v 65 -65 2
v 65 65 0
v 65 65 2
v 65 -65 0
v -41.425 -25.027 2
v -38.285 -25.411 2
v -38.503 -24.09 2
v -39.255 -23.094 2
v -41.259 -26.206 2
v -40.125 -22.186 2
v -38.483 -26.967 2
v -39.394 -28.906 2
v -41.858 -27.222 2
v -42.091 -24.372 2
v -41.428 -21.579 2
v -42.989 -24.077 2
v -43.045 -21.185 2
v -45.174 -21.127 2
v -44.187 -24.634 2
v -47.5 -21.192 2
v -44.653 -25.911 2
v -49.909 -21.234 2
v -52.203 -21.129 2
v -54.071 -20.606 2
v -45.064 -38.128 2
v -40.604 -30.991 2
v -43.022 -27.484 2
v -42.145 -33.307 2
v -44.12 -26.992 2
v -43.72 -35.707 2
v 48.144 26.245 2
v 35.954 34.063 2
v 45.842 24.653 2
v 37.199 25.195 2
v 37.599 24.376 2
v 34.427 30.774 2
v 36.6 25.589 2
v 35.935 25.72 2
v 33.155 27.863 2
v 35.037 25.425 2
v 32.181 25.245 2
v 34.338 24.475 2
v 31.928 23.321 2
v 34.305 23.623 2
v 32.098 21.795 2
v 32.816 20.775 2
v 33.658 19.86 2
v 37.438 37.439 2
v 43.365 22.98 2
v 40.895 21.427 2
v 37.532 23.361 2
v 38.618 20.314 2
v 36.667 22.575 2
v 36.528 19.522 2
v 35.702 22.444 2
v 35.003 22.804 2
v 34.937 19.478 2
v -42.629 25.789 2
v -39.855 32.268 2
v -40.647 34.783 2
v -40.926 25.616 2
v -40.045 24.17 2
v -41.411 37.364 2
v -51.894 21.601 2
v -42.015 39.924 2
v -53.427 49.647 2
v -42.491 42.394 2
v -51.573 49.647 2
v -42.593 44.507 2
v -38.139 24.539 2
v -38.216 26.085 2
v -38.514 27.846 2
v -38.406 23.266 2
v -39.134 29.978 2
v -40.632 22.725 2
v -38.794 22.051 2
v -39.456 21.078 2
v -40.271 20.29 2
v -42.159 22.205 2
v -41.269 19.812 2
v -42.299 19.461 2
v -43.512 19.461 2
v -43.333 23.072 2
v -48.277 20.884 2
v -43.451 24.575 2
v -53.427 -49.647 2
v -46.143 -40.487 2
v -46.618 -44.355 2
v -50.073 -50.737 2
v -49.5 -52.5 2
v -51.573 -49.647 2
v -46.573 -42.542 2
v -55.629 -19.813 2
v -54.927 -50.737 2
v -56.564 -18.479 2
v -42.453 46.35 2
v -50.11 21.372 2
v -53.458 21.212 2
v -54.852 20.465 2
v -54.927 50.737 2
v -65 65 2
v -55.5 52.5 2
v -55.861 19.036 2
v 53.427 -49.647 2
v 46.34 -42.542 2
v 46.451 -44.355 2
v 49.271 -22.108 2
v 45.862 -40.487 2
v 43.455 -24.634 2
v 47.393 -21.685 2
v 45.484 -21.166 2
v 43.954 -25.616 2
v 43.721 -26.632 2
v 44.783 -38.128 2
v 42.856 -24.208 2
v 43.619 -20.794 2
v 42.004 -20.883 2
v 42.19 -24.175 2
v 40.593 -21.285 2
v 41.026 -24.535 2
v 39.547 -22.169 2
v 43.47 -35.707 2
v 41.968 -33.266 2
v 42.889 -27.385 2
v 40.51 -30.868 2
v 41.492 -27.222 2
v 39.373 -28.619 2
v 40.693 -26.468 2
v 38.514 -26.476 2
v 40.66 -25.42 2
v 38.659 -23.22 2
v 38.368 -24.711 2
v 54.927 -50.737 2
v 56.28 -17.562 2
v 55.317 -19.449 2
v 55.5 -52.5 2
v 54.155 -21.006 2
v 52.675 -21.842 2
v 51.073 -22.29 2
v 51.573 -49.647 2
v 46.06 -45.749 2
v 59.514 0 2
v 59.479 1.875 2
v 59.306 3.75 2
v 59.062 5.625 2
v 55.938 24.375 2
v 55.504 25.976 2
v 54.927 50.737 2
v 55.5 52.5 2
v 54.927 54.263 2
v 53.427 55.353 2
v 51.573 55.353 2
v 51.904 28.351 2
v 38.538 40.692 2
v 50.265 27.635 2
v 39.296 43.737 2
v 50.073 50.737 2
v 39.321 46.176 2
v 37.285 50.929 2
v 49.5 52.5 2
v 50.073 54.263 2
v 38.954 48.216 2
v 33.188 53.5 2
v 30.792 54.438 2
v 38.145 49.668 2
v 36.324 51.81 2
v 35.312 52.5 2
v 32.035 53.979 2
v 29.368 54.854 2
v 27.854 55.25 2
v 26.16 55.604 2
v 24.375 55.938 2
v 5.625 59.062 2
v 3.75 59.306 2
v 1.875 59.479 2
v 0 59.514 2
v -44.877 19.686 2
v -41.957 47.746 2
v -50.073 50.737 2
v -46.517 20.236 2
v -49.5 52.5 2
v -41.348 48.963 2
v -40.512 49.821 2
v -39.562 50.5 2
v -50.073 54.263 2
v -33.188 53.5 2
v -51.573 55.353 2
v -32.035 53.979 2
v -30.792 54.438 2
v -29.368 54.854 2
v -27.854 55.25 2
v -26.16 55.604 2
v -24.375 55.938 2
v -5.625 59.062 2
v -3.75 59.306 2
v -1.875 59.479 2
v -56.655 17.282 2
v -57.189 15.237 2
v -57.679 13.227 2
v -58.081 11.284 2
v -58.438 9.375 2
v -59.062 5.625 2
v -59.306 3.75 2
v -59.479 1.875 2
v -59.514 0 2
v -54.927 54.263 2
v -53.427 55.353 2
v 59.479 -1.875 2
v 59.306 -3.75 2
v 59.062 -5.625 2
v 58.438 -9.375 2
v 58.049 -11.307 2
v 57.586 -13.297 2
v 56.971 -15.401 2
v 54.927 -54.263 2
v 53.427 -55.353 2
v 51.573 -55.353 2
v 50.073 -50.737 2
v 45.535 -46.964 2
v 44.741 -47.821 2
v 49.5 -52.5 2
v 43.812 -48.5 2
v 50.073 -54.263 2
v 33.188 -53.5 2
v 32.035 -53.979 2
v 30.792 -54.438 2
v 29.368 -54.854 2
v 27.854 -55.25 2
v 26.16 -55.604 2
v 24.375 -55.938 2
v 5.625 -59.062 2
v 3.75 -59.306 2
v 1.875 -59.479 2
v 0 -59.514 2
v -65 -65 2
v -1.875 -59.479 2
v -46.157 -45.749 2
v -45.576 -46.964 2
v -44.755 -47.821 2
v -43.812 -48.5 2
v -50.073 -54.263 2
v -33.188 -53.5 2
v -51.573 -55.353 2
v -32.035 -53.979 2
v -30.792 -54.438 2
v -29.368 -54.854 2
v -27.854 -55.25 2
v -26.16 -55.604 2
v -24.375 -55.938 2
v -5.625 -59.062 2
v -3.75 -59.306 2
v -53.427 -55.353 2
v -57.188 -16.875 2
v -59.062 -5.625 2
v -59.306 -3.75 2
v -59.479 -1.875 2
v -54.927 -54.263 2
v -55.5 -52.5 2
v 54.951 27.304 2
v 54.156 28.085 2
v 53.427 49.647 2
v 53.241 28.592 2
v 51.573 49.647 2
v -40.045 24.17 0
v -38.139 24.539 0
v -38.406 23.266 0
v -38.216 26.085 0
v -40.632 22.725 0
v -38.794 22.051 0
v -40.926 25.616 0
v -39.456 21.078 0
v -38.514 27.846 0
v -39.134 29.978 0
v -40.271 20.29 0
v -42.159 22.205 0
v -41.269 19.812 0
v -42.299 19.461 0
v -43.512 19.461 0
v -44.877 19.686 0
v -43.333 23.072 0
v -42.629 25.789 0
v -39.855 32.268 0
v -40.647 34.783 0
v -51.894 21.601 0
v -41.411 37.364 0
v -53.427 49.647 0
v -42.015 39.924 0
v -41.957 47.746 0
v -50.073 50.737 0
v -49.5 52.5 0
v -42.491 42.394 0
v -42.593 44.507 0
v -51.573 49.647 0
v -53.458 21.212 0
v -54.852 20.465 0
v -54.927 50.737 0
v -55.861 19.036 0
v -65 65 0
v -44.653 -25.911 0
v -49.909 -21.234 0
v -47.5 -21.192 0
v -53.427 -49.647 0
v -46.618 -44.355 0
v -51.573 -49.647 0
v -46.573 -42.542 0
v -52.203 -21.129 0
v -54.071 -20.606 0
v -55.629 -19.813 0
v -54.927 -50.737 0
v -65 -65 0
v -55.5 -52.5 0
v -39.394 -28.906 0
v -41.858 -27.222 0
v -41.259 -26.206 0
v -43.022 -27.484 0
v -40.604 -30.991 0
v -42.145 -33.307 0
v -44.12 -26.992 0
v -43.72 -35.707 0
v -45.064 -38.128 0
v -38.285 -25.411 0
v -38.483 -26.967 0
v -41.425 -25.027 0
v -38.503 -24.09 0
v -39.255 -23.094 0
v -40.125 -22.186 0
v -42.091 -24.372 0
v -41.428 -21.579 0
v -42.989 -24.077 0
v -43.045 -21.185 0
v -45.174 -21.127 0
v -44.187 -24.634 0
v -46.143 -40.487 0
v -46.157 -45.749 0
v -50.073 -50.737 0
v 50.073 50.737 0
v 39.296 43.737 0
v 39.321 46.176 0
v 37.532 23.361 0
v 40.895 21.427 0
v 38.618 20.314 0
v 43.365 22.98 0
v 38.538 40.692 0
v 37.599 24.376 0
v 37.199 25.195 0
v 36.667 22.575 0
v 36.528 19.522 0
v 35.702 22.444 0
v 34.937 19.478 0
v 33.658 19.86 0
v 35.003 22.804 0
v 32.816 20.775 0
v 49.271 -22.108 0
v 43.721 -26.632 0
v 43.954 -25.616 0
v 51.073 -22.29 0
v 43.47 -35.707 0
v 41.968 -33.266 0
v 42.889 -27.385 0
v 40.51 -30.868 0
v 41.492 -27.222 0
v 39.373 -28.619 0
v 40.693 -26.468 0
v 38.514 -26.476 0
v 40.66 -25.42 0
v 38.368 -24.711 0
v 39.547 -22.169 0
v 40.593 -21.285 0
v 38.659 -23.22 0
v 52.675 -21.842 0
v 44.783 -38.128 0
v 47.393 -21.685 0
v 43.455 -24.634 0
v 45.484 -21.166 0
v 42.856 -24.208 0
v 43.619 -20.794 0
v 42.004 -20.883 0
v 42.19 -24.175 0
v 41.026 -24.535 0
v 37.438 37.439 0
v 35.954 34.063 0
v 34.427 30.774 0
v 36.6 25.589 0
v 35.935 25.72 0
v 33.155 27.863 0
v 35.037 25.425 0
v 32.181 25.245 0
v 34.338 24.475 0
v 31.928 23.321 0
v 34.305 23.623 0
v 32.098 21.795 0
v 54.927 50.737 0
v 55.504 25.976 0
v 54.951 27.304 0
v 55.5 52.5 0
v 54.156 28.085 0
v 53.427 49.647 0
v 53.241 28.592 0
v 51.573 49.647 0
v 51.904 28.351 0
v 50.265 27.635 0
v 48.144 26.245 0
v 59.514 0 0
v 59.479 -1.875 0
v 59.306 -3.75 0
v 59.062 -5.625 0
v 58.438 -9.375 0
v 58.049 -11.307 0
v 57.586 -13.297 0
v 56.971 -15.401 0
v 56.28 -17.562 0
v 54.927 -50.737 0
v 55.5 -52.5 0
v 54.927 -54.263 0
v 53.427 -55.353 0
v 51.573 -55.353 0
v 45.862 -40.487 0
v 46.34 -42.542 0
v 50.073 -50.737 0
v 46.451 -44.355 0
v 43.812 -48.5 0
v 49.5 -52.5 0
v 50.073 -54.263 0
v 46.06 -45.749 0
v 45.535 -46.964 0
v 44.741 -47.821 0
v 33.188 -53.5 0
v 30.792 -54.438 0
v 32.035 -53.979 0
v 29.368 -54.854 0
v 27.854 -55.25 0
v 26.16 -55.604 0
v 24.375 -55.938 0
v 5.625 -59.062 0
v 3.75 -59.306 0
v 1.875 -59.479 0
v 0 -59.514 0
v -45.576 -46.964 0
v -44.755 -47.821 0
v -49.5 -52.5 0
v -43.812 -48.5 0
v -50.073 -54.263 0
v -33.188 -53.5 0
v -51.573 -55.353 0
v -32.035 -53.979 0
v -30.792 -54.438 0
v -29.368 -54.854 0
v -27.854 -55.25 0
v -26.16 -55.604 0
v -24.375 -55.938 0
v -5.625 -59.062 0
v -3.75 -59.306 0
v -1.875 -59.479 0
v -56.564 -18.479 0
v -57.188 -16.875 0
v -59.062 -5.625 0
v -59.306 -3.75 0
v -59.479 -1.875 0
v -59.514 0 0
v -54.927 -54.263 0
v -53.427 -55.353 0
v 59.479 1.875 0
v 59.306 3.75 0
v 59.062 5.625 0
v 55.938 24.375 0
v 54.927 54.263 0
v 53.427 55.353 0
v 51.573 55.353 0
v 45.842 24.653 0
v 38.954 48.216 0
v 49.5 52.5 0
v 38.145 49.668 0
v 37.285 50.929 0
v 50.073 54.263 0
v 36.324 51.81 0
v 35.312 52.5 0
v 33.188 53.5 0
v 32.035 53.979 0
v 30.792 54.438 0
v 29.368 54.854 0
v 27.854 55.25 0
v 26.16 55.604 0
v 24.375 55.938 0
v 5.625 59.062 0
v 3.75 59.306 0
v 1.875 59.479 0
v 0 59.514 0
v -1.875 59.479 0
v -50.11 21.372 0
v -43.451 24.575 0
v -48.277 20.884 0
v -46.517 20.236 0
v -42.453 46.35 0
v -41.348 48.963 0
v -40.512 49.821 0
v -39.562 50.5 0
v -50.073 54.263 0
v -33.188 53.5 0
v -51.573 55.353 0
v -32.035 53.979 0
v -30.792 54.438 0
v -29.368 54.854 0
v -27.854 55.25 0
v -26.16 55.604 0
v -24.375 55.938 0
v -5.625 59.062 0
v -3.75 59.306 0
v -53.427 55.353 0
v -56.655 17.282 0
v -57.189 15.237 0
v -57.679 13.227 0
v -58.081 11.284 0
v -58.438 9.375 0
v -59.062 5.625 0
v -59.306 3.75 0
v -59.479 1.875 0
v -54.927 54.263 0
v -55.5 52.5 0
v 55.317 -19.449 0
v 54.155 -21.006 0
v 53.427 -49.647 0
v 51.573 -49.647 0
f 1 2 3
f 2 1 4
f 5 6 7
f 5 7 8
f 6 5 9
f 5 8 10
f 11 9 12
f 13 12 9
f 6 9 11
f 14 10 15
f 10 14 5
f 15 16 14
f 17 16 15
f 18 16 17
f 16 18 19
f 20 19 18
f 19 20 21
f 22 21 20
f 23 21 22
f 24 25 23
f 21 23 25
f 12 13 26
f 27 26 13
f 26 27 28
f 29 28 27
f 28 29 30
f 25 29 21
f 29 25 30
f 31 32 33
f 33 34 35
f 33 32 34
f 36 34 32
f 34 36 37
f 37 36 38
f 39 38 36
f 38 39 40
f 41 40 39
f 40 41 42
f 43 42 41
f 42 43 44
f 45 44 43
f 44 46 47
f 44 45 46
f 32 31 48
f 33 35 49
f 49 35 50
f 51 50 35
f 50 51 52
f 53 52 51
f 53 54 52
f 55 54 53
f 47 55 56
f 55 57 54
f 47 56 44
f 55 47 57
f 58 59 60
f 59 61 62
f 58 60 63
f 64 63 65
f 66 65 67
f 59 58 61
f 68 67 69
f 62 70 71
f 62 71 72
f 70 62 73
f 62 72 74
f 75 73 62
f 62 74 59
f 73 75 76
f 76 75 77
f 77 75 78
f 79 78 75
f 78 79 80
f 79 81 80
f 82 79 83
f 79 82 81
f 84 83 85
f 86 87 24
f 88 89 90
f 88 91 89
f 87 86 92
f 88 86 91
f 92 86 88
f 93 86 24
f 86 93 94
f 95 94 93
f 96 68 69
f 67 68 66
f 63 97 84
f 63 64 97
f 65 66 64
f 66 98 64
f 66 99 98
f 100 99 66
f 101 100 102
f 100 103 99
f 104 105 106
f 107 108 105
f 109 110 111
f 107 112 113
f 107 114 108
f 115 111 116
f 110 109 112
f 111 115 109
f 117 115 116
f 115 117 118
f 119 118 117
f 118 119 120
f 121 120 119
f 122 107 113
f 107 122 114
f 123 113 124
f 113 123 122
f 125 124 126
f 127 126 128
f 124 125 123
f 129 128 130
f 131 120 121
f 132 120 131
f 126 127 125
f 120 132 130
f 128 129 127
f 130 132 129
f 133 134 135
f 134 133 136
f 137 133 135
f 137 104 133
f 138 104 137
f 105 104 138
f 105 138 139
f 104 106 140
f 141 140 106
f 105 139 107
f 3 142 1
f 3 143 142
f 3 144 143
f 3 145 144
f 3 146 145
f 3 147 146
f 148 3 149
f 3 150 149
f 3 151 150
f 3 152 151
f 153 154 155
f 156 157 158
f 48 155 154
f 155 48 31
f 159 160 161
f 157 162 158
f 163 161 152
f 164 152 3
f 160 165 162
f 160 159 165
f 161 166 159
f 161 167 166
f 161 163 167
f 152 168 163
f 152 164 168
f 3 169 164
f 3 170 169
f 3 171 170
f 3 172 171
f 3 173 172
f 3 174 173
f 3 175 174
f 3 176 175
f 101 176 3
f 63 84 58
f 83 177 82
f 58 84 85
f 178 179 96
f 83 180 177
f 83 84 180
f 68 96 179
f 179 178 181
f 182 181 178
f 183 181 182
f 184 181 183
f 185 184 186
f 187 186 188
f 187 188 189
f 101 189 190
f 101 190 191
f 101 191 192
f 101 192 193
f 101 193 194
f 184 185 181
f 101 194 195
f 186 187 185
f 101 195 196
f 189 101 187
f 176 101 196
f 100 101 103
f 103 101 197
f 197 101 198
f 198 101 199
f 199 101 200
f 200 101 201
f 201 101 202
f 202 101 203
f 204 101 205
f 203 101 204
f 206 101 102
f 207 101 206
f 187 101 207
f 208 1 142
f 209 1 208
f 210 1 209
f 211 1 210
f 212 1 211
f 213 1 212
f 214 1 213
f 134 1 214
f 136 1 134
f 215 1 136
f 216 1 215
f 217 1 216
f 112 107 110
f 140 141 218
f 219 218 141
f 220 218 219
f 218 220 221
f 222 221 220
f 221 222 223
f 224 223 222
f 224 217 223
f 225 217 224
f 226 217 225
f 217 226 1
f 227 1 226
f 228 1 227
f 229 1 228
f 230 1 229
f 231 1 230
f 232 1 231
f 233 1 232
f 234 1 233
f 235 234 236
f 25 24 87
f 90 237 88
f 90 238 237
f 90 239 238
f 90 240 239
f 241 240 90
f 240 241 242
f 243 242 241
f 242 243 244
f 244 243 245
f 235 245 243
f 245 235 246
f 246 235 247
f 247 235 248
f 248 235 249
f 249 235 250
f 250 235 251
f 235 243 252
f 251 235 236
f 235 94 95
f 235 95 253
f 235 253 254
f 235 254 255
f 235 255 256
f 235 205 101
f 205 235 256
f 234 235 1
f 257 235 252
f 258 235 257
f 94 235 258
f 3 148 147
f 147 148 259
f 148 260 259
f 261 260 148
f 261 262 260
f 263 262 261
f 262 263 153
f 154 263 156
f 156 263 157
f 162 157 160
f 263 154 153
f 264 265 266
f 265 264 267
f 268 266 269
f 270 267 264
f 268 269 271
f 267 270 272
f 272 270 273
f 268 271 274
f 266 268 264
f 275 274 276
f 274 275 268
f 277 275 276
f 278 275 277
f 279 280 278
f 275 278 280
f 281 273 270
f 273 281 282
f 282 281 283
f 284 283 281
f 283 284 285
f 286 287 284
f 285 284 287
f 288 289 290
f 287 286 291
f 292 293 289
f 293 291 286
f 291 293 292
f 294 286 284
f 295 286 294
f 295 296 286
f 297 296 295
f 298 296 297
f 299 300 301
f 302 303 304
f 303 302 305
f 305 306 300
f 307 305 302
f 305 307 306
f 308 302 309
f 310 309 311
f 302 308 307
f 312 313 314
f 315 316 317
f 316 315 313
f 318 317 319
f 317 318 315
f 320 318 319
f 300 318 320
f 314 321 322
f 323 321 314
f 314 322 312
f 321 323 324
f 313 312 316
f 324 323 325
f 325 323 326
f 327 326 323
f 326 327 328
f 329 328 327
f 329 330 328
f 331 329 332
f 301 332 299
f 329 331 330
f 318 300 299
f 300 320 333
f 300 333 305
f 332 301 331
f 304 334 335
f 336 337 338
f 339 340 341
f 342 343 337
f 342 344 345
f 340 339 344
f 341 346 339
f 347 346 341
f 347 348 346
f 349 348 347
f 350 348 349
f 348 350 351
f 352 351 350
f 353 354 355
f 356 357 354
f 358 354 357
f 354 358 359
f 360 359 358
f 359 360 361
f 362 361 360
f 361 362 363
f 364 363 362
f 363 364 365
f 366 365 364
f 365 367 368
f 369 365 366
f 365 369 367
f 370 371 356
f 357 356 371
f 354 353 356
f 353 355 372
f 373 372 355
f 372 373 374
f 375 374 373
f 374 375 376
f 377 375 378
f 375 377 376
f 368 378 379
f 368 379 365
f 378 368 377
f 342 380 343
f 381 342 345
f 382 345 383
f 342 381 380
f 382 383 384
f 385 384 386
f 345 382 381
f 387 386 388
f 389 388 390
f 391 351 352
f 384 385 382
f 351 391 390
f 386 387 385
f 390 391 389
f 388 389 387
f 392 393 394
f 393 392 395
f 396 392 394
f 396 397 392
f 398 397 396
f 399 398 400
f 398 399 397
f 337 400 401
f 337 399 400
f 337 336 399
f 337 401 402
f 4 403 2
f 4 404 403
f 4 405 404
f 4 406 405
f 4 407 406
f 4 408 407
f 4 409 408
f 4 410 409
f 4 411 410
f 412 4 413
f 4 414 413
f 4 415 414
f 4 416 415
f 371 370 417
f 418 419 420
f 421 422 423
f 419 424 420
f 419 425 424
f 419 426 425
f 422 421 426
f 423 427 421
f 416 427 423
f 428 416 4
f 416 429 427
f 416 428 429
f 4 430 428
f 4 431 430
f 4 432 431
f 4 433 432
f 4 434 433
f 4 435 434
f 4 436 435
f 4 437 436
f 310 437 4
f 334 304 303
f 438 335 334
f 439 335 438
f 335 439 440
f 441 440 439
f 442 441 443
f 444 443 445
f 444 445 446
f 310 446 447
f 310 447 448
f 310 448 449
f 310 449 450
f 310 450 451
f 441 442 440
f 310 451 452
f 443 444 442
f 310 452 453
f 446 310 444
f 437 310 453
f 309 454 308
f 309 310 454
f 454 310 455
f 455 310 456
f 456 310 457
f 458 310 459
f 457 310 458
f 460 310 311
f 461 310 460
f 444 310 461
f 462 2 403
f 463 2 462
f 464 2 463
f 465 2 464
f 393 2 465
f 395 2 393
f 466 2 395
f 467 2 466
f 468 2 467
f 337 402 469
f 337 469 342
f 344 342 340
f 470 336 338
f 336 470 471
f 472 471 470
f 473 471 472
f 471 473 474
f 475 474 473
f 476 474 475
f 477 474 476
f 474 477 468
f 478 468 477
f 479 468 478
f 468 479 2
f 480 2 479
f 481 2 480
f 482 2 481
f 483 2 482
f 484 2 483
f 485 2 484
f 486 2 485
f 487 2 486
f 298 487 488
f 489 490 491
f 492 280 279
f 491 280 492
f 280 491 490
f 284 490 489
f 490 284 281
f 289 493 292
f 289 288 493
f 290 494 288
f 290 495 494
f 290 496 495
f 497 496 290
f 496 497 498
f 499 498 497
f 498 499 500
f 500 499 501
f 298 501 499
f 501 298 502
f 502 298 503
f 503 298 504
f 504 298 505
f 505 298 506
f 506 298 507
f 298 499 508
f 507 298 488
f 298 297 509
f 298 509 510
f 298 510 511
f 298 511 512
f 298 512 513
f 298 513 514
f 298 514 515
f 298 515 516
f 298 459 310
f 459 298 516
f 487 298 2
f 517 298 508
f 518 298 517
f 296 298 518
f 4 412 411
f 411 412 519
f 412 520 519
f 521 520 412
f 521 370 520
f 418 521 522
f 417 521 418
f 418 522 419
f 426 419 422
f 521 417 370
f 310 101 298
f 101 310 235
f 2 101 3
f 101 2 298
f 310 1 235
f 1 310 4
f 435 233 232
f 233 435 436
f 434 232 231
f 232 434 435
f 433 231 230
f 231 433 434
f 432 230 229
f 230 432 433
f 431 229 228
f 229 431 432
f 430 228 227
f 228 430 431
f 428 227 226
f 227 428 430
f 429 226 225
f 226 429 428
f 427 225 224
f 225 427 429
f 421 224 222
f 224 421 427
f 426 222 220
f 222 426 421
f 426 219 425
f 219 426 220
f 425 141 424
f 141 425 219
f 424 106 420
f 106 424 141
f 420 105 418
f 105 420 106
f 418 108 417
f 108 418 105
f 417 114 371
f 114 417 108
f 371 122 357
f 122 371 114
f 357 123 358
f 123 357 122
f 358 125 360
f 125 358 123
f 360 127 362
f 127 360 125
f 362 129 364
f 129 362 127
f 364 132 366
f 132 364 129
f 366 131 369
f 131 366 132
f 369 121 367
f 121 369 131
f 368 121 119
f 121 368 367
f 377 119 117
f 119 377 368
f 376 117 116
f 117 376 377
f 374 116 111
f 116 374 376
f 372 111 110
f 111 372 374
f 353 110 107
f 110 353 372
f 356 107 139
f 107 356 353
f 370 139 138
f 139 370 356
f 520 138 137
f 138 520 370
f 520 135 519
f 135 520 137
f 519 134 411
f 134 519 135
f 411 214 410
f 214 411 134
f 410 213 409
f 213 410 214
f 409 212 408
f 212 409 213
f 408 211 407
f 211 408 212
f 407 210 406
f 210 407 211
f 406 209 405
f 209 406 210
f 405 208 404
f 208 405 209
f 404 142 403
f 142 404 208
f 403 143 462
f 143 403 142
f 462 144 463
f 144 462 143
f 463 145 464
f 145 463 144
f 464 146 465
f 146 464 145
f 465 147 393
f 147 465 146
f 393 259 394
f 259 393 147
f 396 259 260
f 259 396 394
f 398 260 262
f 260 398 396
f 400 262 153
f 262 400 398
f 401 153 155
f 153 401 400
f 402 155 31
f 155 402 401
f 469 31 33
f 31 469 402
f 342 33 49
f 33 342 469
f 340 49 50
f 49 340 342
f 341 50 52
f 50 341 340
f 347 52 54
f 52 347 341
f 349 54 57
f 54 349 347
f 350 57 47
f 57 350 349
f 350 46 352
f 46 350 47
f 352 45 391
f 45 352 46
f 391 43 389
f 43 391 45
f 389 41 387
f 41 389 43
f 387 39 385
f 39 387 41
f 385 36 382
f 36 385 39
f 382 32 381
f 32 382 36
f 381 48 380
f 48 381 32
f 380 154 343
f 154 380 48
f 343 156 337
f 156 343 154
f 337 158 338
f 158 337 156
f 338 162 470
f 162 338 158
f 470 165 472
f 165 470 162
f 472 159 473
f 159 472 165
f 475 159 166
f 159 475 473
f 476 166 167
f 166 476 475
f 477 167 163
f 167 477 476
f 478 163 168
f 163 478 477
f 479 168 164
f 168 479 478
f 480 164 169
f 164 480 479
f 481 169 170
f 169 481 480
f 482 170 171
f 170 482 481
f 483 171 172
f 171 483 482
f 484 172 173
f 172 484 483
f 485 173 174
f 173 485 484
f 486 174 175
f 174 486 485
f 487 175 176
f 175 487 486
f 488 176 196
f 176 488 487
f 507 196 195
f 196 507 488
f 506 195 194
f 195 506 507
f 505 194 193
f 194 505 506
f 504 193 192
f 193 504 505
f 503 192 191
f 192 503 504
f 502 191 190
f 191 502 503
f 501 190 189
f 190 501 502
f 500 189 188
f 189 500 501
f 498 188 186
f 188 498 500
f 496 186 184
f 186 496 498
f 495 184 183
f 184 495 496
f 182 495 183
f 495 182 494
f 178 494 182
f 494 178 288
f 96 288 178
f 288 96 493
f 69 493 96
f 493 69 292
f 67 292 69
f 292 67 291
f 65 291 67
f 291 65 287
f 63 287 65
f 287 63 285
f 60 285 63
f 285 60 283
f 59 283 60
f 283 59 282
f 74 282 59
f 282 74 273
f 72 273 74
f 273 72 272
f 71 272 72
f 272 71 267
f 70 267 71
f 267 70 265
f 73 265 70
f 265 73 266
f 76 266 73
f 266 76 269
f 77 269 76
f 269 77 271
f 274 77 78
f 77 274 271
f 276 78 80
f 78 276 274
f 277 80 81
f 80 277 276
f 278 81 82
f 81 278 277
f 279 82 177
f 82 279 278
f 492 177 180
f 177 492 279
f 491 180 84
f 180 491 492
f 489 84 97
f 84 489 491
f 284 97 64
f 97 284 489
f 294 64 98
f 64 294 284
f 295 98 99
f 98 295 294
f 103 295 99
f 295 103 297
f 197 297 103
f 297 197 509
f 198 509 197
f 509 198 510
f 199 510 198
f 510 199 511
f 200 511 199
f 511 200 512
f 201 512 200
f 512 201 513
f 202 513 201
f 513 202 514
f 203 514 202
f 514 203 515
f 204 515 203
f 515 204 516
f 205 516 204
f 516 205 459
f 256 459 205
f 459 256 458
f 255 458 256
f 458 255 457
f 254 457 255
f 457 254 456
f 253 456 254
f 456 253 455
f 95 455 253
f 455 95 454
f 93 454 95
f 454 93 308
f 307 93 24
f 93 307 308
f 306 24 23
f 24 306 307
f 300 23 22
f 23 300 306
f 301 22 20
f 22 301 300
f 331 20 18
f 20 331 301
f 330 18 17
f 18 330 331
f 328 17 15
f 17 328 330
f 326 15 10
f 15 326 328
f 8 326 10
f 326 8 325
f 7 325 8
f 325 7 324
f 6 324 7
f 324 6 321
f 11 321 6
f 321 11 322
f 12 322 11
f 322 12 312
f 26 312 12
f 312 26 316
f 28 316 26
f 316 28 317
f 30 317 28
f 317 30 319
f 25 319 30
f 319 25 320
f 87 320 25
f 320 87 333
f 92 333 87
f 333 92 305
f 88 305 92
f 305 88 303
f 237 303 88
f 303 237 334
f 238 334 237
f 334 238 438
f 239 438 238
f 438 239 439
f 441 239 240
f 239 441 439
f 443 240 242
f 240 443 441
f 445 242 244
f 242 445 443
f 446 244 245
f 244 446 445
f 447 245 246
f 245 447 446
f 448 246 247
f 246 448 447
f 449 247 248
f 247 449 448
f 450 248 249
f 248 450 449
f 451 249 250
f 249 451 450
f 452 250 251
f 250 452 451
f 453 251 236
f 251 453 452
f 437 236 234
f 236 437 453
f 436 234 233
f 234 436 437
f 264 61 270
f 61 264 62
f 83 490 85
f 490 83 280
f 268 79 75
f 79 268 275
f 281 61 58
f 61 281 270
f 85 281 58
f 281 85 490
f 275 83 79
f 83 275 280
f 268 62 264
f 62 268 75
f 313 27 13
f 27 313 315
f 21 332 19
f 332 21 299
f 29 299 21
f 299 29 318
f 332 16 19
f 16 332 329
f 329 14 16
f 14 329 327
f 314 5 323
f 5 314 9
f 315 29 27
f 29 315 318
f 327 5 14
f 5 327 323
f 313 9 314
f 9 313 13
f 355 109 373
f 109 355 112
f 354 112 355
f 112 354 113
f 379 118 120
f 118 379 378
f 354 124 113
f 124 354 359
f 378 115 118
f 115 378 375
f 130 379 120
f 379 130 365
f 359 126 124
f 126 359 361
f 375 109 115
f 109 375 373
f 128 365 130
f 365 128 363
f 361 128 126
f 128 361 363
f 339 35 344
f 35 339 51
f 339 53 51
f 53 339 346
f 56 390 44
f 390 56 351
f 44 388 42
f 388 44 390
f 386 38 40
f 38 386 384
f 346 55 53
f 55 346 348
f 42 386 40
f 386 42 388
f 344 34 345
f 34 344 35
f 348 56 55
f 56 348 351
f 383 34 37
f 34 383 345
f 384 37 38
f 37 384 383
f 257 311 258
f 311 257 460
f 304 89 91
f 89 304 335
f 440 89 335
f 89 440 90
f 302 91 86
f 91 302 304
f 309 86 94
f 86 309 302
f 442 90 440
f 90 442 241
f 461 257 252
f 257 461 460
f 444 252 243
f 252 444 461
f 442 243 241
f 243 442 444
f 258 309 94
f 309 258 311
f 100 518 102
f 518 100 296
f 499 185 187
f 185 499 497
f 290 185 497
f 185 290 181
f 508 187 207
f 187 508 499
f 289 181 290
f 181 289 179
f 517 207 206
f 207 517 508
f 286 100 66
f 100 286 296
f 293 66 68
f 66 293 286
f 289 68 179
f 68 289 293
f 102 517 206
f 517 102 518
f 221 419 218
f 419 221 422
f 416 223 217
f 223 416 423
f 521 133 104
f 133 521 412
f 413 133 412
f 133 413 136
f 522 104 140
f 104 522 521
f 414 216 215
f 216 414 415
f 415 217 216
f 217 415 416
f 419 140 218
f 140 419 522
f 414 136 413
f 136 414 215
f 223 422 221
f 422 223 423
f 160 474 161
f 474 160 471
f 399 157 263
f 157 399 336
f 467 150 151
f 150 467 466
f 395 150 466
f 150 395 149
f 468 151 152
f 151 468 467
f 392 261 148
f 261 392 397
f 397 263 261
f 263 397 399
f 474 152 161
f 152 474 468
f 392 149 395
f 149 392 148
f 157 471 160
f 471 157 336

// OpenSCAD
s = 2;
//hole radius for fan
hl = 3;


difference(){
    translate([-65,-65,0]) cube([130,130,s]);
    
    linear_extrude(s)polygon([[-39.13413698447713,29.978457173163335],[-38.51373070507356,27.84559722394081],[-38.2156584144104,26.084708049862694],[-38.13940736331052,24.538811158666213],[-38.4062860421601,23.26592034097021],[-38.794473211395854,22.05104331389306],[-39.456470973217534,21.078459177047588],[-40.27097083723898,20.290154139814945],[-41.269166415273766,19.812393511189097],[-42.29855560512215,19.460898191557227],[-43.511640508983874,19.460898191557224],[-44.87722751504536,19.68612820219512],[-46.51662511369278,20.235552925114842],[-48.27733120272638,20.883942349678485],[-50.110237992376334,21.372017125787696],[-51.89403699225645,21.600812551798555],[-53.458311922210754,21.21208457596877],[-54.85217057200906,20.46511254839671],[-55.860786269364894,19.03553555451133],[-56.65457529443425,17.281597646054912],[-57.189127255086646,15.237181960198702],[-57.67926882360857,13.22664941151373],[-58.08058960786952,11.283883137171244],[-58.4375,9.375],[-58.75,7.5],[-59.0625,5.625],[-59.305555555555564,3.75],[-59.47916666666667,1.875],[-59.51388888888889,0],[-59.47916666666667,-1.875],[-59.305555555555564,-3.75],[-59.0625,-5.625],[-58.75,-7.5],[-58.4375,-9.375],[-58.125,-11.25],[-57.8125,-13.125],[-57.5,-15],[-57.1875,-16.875],[-56.563773582560394,-18.479485708410085],[-55.62882074768119,-19.813457125230258],[-54.07141507792279,-20.6063999588706],[-52.20278299072478,-21.12882850092103],[-49.908610562977806,-21.23383578458582],[-47.50012421212148,-21.191936101454885],[-45.174236432486026,-21.126736776322417],[-43.04526114718082,-21.18514477598414],[-41.427953384054085,-21.579494399121895],[-40.12540064877558,-22.186178320941497],[-39.25544547486331,-23.0939235153306],[-38.503332834469035,-24.09039568360737],[-38.28497755177393,-25.411062564165956],[-38.48253709325998,-26.96719718311871],[-39.39408374959036,-28.905540304972146],[-40.60370269658391,-30.99062419133208],[-42.144942819567184,-33.30655820369075],[-43.71973182787702,-35.70660157754165],[-45.0635463161768,-38.12812290987047],[-46.14283739913997,-40.487012839185],[-46.5726708423614,-42.541932816109025],[-46.61757005117769,-44.35551424365683],[-46.15712419652031,-45.749049975466484],[-45.576267512794416,-46.96387856091421],[-44.75458917093147,-47.82129285363808],[-43.8125,-48.5],[-42.75,-49],[-41.6875,-49.5],[-40.625,-50],[-39.5625,-50.5],[-38.5,-51],[-37.4375,-51.5],[-36.375,-52],[-35.3125,-52.5],[-34.25,-53],[-33.1875,-53.5],[-32.03472222222222,-53.979166666666664],[-30.791666666666664,-54.4375],[-29.368055555555554,-54.854166666666664],[-27.854166666666664,-55.25],[-26.159722222222218,-55.604166666666664],[-24.375,-55.9375],[-22.5,-56.25],[-20.625,-56.5625],[-18.75,-56.875],[-16.875,-57.1875],[-15,-57.5],[-13.125,-57.8125],[-11.25,-58.125],[-9.375,-58.4375],[-7.5,-58.75],[-5.625,-59.0625],[-3.75,-59.305555555555564],[-1.875,-59.47916666666667],[0,-59.51388888888889],[1.875,-59.47916666666667],[3.75,-59.305555555555564],[5.625,-59.0625],[7.5,-58.75],[9.375,-58.4375],[11.25,-58.125],[13.125,-57.8125],[15,-57.5],[16.875,-57.1875],[18.75,-56.875],[20.625,-56.5625],[22.5,-56.25],[24.375,-55.9375],[26.159722222222218,-55.604166666666664],[27.854166666666664,-55.25],[29.368055555555554,-54.854166666666664],[30.791666666666664,-54.4375],[32.03472222222222,-53.979166666666664],[33.1875,-53.5],[34.25,-53],[35.3125,-52.5],[36.375,-52],[37.4375,-51.5],[38.5,-51],[39.5625,-50.5],[40.625,-50],[41.6875,-49.5],[42.75,-49],[43.8125,-48.5],[44.74072434424223,-47.82129285363808],[45.53467303272667,-46.96387856091421],[46.060070409695555,-45.749049975466484],[46.45119213090666,-44.35551424365683],[46.34043374629574,-42.54193281610903],[45.86207091162056,-40.48701283918501],[44.78277483257466,-38.12812290987048],[43.47014995922228,-35.70660157754166],[41.96814404671105,-33.26560729266569],[40.51008588934747,-30.867771458256875],[39.373252036585626,-28.618883927796645],[38.51369473327789,-26.475786250817855],[38.36812454481448,-24.711484500820983],[38.6592649217413,-23.220188824324588],[39.546549879994444,-22.169115441347724],[40.593268854183705,-21.28525827838991],[42.00391329953148,-20.8825743199767],[43.619049200101664,-20.793847346089045],[45.48373399518055,-21.165818121233453],[47.393476229545726,-21.684529660884373],[49.27144145769851,-22.108277464239876],[51.0725722403526,-22.290320766793464],[52.67497669272302,-21.842214303236698],[54.15548926030847,-21.00566257437149],[55.31661305516335,-19.449479513789306],[56.28023996207263,-17.562110386798572],[56.970764977875696,-15.400814392299168],[57.58568499051816,-13.296777596699645],[58.04939499683939,-11.30725919889988],[58.4375,-9.375],[58.75,-7.5],[59.0625,-5.625],[59.305555555555564,-3.75],[59.47916666666667,-1.875],[59.51388888888889,0],[59.47916666666667,1.875],[59.305555555555564,3.75],[59.0625,5.625],[58.75,7.5],[58.4375,9.375],[58.125,11.25],[57.8125,13.125],[57.5,15],[57.1875,16.875],[56.875,18.75],[56.5625,20.625],[56.25,22.5],[55.9375,24.375],[55.504462864634014,25.97641889990477],[54.950888593902036,27.30425669971431],[54.15624005243807,28.08493229933339],[53.241054375608115,28.592026798857233],[51.90385596942129,28.351025943289546],[50.26518196924358,27.635510832725558],[48.14409391645008,26.244548312264186],[45.8420674050317,24.652652636901742],[43.36532564724505,22.979672788100217],[40.89480710171503,21.426541920760688],[38.61767343932316,20.314042171246218],[36.52770144781282,19.522324558094816],[34.93682724531987,19.477961071150986],[33.65788916096278,19.86016957405166],[32.81566164199592,20.774739920278282],[32.09820857028342,21.795100119986337],[31.928376683742783,23.320521555670286],[32.18139153511966,25.245214373848697],[33.155325415077215,27.86266010353458],[34.42733158569794,30.773587362233485],[35.95428283634994,34.06350222344589],[37.43810687637004,37.43892315815878],[38.537604204463186,40.691874710859615],[39.29590203126128,43.73685080804792],[39.32113420862282,46.17553440808468],[38.95450023784288,48.21590096648246],[38.145333472075016,49.66760889711477],[37.285500059460716,50.92897524162062],[36.32433335315357,51.809658413873535],[35.3125,52.5],[34.25,53],[33.1875,53.5],[32.03472222222222,53.979166666666664],[30.791666666666664,54.4375],[29.368055555555554,54.854166666666664],[27.854166666666664,55.25],[26.159722222222218,55.604166666666664],[24.375,55.9375],[22.5,56.25],[20.625,56.5625],[18.75,56.875],[16.875,57.1875],[15,57.5],[13.125,57.8125],[11.25,58.125],[9.375,58.4375],[7.5,58.75],[5.625,59.0625],[3.75,59.305555555555564],[1.875,59.47916666666667],[0,59.51388888888889],[-1.875,59.47916666666667],[-3.75,59.305555555555564],[-5.625,59.0625],[-7.5,58.75],[-9.375,58.4375],[-11.25,58.125],[-13.125,57.8125],[-15,57.5],[-16.875,57.1875],[-18.75,56.875],[-20.625,56.5625],[-22.5,56.25],[-24.375,55.9375],[-26.159722222222218,55.604166666666664],[-27.854166666666664,55.25],[-29.368055555555554,54.854166666666664],[-30.791666666666664,54.4375],[-32.03472222222222,53.979166666666664],[-33.1875,53.5],[-34.25,53],[-35.3125,52.5],[-36.375,52],[-37.4375,51.5],[-38.5,51],[-39.5625,50.5],[-40.51173410670538,49.82085048248526],[-41.347702320116156,48.962551447455795],[-41.9571387469377,47.74595337739686],[-42.45330928046464,46.35020578982318],[-42.59338391788706,44.5066695280085],[-42.49062855249957,42.39449410946756],[-42.01547907478689,39.924189894988814],[-41.410765487558905,37.36439604129853],[-40.64743643047745,34.782601401447955],[-39.85505601305782,32.268295614648636],]);

    
    linear_extrude(s)polygon([[-43.45087480193704,24.574883299583608],[-43.333440028050596,23.071743977251536],[-42.159092289186134,22.204548214367644],[-40.63244022866233,22.72486567209798],[-40.045266359230105,24.170191943571126],[-40.92602716337845,25.615518215044272],[-42.62883138473192,25.78895736762105],]);

    linear_extrude(s) polygon([[-44.18679571724626,-24.633610618110872],[-44.65262032032917,-25.911279042093135],[-44.120249345377275,-26.992383093155045],[-43.022234209539,-27.483794025455914],[-41.85767270183175,-27.22170819489545],[-41.25875535501088,-26.206125601473655],[-41.425121284683335,-25.026739363951567],[-42.0905850033732,-24.371524787550406],[-42.98896102360451,-24.076678228169886],]);

    
    linear_extrude(s)polygon([[41.025833460990484,-24.5353284316507],[40.65982841571106,-25.419868109792265],[40.69310160164555,-26.46821143203412],[41.491658064073384,-27.221708194895452],[42.88913187332209,-27.385511838995747],[43.72096152168442,-26.632015076134408],[43.95387382322587,-25.616432482712614],[43.45477603420848,-24.633610618110872],[42.855858687387595,-24.20772114345012],[42.19039496869774,-24.17496041463006],]);

    
    linear_extrude(s)polygon([[35.03665999278173,25.42478301893774],[34.337923088157375,24.47472188315606],[34.30464990222288,23.62294293383455],[35.00338680684724,22.803924713333103],[35.702123711471586,22.443556696312463],[36.66704610357189,22.574599611592696],[37.532148937868705,23.36085710327409],[37.59869530973769,24.37643969669589],[37.19941707852378,25.195457917197338],[36.600499731702904,25.588586663038033],[35.93503601301304,25.719629578318266],]);

    translate([-52.5,-52.5,0]) cylinder(s,hl,hl); 
    translate([-52.5,52.5,0]) cylinder(s,hl,hl); 
    translate([52.5,-52.5,0]) cylinder(s,hl,hl); 
    translate([52.5,52.5,0]) cylinder(s,hl,hl); 
    }
